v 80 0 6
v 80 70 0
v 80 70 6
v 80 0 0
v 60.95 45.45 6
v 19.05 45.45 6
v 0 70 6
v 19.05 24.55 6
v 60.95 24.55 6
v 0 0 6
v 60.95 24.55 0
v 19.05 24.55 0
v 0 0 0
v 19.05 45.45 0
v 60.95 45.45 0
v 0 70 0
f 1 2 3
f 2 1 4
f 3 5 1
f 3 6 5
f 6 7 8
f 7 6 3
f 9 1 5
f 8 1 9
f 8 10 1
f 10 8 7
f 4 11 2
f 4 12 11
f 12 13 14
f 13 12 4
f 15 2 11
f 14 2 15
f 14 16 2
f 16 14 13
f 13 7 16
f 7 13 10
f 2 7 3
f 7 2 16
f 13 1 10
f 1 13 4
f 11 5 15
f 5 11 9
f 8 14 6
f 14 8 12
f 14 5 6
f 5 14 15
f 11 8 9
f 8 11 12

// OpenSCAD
module pt_bracket() {
  w=80.0; h=70.0; t=6.0;
  difference() {
    cube([w,h,t], center=false);
    translate([(w-40.7-2*0.6)/2, (h-19.7-2*0.6)/2, -1])
      cube([40.7+2*0.6, 19.7+2*0.6, t+2], center=false);
  }
}
pt_bracket();
